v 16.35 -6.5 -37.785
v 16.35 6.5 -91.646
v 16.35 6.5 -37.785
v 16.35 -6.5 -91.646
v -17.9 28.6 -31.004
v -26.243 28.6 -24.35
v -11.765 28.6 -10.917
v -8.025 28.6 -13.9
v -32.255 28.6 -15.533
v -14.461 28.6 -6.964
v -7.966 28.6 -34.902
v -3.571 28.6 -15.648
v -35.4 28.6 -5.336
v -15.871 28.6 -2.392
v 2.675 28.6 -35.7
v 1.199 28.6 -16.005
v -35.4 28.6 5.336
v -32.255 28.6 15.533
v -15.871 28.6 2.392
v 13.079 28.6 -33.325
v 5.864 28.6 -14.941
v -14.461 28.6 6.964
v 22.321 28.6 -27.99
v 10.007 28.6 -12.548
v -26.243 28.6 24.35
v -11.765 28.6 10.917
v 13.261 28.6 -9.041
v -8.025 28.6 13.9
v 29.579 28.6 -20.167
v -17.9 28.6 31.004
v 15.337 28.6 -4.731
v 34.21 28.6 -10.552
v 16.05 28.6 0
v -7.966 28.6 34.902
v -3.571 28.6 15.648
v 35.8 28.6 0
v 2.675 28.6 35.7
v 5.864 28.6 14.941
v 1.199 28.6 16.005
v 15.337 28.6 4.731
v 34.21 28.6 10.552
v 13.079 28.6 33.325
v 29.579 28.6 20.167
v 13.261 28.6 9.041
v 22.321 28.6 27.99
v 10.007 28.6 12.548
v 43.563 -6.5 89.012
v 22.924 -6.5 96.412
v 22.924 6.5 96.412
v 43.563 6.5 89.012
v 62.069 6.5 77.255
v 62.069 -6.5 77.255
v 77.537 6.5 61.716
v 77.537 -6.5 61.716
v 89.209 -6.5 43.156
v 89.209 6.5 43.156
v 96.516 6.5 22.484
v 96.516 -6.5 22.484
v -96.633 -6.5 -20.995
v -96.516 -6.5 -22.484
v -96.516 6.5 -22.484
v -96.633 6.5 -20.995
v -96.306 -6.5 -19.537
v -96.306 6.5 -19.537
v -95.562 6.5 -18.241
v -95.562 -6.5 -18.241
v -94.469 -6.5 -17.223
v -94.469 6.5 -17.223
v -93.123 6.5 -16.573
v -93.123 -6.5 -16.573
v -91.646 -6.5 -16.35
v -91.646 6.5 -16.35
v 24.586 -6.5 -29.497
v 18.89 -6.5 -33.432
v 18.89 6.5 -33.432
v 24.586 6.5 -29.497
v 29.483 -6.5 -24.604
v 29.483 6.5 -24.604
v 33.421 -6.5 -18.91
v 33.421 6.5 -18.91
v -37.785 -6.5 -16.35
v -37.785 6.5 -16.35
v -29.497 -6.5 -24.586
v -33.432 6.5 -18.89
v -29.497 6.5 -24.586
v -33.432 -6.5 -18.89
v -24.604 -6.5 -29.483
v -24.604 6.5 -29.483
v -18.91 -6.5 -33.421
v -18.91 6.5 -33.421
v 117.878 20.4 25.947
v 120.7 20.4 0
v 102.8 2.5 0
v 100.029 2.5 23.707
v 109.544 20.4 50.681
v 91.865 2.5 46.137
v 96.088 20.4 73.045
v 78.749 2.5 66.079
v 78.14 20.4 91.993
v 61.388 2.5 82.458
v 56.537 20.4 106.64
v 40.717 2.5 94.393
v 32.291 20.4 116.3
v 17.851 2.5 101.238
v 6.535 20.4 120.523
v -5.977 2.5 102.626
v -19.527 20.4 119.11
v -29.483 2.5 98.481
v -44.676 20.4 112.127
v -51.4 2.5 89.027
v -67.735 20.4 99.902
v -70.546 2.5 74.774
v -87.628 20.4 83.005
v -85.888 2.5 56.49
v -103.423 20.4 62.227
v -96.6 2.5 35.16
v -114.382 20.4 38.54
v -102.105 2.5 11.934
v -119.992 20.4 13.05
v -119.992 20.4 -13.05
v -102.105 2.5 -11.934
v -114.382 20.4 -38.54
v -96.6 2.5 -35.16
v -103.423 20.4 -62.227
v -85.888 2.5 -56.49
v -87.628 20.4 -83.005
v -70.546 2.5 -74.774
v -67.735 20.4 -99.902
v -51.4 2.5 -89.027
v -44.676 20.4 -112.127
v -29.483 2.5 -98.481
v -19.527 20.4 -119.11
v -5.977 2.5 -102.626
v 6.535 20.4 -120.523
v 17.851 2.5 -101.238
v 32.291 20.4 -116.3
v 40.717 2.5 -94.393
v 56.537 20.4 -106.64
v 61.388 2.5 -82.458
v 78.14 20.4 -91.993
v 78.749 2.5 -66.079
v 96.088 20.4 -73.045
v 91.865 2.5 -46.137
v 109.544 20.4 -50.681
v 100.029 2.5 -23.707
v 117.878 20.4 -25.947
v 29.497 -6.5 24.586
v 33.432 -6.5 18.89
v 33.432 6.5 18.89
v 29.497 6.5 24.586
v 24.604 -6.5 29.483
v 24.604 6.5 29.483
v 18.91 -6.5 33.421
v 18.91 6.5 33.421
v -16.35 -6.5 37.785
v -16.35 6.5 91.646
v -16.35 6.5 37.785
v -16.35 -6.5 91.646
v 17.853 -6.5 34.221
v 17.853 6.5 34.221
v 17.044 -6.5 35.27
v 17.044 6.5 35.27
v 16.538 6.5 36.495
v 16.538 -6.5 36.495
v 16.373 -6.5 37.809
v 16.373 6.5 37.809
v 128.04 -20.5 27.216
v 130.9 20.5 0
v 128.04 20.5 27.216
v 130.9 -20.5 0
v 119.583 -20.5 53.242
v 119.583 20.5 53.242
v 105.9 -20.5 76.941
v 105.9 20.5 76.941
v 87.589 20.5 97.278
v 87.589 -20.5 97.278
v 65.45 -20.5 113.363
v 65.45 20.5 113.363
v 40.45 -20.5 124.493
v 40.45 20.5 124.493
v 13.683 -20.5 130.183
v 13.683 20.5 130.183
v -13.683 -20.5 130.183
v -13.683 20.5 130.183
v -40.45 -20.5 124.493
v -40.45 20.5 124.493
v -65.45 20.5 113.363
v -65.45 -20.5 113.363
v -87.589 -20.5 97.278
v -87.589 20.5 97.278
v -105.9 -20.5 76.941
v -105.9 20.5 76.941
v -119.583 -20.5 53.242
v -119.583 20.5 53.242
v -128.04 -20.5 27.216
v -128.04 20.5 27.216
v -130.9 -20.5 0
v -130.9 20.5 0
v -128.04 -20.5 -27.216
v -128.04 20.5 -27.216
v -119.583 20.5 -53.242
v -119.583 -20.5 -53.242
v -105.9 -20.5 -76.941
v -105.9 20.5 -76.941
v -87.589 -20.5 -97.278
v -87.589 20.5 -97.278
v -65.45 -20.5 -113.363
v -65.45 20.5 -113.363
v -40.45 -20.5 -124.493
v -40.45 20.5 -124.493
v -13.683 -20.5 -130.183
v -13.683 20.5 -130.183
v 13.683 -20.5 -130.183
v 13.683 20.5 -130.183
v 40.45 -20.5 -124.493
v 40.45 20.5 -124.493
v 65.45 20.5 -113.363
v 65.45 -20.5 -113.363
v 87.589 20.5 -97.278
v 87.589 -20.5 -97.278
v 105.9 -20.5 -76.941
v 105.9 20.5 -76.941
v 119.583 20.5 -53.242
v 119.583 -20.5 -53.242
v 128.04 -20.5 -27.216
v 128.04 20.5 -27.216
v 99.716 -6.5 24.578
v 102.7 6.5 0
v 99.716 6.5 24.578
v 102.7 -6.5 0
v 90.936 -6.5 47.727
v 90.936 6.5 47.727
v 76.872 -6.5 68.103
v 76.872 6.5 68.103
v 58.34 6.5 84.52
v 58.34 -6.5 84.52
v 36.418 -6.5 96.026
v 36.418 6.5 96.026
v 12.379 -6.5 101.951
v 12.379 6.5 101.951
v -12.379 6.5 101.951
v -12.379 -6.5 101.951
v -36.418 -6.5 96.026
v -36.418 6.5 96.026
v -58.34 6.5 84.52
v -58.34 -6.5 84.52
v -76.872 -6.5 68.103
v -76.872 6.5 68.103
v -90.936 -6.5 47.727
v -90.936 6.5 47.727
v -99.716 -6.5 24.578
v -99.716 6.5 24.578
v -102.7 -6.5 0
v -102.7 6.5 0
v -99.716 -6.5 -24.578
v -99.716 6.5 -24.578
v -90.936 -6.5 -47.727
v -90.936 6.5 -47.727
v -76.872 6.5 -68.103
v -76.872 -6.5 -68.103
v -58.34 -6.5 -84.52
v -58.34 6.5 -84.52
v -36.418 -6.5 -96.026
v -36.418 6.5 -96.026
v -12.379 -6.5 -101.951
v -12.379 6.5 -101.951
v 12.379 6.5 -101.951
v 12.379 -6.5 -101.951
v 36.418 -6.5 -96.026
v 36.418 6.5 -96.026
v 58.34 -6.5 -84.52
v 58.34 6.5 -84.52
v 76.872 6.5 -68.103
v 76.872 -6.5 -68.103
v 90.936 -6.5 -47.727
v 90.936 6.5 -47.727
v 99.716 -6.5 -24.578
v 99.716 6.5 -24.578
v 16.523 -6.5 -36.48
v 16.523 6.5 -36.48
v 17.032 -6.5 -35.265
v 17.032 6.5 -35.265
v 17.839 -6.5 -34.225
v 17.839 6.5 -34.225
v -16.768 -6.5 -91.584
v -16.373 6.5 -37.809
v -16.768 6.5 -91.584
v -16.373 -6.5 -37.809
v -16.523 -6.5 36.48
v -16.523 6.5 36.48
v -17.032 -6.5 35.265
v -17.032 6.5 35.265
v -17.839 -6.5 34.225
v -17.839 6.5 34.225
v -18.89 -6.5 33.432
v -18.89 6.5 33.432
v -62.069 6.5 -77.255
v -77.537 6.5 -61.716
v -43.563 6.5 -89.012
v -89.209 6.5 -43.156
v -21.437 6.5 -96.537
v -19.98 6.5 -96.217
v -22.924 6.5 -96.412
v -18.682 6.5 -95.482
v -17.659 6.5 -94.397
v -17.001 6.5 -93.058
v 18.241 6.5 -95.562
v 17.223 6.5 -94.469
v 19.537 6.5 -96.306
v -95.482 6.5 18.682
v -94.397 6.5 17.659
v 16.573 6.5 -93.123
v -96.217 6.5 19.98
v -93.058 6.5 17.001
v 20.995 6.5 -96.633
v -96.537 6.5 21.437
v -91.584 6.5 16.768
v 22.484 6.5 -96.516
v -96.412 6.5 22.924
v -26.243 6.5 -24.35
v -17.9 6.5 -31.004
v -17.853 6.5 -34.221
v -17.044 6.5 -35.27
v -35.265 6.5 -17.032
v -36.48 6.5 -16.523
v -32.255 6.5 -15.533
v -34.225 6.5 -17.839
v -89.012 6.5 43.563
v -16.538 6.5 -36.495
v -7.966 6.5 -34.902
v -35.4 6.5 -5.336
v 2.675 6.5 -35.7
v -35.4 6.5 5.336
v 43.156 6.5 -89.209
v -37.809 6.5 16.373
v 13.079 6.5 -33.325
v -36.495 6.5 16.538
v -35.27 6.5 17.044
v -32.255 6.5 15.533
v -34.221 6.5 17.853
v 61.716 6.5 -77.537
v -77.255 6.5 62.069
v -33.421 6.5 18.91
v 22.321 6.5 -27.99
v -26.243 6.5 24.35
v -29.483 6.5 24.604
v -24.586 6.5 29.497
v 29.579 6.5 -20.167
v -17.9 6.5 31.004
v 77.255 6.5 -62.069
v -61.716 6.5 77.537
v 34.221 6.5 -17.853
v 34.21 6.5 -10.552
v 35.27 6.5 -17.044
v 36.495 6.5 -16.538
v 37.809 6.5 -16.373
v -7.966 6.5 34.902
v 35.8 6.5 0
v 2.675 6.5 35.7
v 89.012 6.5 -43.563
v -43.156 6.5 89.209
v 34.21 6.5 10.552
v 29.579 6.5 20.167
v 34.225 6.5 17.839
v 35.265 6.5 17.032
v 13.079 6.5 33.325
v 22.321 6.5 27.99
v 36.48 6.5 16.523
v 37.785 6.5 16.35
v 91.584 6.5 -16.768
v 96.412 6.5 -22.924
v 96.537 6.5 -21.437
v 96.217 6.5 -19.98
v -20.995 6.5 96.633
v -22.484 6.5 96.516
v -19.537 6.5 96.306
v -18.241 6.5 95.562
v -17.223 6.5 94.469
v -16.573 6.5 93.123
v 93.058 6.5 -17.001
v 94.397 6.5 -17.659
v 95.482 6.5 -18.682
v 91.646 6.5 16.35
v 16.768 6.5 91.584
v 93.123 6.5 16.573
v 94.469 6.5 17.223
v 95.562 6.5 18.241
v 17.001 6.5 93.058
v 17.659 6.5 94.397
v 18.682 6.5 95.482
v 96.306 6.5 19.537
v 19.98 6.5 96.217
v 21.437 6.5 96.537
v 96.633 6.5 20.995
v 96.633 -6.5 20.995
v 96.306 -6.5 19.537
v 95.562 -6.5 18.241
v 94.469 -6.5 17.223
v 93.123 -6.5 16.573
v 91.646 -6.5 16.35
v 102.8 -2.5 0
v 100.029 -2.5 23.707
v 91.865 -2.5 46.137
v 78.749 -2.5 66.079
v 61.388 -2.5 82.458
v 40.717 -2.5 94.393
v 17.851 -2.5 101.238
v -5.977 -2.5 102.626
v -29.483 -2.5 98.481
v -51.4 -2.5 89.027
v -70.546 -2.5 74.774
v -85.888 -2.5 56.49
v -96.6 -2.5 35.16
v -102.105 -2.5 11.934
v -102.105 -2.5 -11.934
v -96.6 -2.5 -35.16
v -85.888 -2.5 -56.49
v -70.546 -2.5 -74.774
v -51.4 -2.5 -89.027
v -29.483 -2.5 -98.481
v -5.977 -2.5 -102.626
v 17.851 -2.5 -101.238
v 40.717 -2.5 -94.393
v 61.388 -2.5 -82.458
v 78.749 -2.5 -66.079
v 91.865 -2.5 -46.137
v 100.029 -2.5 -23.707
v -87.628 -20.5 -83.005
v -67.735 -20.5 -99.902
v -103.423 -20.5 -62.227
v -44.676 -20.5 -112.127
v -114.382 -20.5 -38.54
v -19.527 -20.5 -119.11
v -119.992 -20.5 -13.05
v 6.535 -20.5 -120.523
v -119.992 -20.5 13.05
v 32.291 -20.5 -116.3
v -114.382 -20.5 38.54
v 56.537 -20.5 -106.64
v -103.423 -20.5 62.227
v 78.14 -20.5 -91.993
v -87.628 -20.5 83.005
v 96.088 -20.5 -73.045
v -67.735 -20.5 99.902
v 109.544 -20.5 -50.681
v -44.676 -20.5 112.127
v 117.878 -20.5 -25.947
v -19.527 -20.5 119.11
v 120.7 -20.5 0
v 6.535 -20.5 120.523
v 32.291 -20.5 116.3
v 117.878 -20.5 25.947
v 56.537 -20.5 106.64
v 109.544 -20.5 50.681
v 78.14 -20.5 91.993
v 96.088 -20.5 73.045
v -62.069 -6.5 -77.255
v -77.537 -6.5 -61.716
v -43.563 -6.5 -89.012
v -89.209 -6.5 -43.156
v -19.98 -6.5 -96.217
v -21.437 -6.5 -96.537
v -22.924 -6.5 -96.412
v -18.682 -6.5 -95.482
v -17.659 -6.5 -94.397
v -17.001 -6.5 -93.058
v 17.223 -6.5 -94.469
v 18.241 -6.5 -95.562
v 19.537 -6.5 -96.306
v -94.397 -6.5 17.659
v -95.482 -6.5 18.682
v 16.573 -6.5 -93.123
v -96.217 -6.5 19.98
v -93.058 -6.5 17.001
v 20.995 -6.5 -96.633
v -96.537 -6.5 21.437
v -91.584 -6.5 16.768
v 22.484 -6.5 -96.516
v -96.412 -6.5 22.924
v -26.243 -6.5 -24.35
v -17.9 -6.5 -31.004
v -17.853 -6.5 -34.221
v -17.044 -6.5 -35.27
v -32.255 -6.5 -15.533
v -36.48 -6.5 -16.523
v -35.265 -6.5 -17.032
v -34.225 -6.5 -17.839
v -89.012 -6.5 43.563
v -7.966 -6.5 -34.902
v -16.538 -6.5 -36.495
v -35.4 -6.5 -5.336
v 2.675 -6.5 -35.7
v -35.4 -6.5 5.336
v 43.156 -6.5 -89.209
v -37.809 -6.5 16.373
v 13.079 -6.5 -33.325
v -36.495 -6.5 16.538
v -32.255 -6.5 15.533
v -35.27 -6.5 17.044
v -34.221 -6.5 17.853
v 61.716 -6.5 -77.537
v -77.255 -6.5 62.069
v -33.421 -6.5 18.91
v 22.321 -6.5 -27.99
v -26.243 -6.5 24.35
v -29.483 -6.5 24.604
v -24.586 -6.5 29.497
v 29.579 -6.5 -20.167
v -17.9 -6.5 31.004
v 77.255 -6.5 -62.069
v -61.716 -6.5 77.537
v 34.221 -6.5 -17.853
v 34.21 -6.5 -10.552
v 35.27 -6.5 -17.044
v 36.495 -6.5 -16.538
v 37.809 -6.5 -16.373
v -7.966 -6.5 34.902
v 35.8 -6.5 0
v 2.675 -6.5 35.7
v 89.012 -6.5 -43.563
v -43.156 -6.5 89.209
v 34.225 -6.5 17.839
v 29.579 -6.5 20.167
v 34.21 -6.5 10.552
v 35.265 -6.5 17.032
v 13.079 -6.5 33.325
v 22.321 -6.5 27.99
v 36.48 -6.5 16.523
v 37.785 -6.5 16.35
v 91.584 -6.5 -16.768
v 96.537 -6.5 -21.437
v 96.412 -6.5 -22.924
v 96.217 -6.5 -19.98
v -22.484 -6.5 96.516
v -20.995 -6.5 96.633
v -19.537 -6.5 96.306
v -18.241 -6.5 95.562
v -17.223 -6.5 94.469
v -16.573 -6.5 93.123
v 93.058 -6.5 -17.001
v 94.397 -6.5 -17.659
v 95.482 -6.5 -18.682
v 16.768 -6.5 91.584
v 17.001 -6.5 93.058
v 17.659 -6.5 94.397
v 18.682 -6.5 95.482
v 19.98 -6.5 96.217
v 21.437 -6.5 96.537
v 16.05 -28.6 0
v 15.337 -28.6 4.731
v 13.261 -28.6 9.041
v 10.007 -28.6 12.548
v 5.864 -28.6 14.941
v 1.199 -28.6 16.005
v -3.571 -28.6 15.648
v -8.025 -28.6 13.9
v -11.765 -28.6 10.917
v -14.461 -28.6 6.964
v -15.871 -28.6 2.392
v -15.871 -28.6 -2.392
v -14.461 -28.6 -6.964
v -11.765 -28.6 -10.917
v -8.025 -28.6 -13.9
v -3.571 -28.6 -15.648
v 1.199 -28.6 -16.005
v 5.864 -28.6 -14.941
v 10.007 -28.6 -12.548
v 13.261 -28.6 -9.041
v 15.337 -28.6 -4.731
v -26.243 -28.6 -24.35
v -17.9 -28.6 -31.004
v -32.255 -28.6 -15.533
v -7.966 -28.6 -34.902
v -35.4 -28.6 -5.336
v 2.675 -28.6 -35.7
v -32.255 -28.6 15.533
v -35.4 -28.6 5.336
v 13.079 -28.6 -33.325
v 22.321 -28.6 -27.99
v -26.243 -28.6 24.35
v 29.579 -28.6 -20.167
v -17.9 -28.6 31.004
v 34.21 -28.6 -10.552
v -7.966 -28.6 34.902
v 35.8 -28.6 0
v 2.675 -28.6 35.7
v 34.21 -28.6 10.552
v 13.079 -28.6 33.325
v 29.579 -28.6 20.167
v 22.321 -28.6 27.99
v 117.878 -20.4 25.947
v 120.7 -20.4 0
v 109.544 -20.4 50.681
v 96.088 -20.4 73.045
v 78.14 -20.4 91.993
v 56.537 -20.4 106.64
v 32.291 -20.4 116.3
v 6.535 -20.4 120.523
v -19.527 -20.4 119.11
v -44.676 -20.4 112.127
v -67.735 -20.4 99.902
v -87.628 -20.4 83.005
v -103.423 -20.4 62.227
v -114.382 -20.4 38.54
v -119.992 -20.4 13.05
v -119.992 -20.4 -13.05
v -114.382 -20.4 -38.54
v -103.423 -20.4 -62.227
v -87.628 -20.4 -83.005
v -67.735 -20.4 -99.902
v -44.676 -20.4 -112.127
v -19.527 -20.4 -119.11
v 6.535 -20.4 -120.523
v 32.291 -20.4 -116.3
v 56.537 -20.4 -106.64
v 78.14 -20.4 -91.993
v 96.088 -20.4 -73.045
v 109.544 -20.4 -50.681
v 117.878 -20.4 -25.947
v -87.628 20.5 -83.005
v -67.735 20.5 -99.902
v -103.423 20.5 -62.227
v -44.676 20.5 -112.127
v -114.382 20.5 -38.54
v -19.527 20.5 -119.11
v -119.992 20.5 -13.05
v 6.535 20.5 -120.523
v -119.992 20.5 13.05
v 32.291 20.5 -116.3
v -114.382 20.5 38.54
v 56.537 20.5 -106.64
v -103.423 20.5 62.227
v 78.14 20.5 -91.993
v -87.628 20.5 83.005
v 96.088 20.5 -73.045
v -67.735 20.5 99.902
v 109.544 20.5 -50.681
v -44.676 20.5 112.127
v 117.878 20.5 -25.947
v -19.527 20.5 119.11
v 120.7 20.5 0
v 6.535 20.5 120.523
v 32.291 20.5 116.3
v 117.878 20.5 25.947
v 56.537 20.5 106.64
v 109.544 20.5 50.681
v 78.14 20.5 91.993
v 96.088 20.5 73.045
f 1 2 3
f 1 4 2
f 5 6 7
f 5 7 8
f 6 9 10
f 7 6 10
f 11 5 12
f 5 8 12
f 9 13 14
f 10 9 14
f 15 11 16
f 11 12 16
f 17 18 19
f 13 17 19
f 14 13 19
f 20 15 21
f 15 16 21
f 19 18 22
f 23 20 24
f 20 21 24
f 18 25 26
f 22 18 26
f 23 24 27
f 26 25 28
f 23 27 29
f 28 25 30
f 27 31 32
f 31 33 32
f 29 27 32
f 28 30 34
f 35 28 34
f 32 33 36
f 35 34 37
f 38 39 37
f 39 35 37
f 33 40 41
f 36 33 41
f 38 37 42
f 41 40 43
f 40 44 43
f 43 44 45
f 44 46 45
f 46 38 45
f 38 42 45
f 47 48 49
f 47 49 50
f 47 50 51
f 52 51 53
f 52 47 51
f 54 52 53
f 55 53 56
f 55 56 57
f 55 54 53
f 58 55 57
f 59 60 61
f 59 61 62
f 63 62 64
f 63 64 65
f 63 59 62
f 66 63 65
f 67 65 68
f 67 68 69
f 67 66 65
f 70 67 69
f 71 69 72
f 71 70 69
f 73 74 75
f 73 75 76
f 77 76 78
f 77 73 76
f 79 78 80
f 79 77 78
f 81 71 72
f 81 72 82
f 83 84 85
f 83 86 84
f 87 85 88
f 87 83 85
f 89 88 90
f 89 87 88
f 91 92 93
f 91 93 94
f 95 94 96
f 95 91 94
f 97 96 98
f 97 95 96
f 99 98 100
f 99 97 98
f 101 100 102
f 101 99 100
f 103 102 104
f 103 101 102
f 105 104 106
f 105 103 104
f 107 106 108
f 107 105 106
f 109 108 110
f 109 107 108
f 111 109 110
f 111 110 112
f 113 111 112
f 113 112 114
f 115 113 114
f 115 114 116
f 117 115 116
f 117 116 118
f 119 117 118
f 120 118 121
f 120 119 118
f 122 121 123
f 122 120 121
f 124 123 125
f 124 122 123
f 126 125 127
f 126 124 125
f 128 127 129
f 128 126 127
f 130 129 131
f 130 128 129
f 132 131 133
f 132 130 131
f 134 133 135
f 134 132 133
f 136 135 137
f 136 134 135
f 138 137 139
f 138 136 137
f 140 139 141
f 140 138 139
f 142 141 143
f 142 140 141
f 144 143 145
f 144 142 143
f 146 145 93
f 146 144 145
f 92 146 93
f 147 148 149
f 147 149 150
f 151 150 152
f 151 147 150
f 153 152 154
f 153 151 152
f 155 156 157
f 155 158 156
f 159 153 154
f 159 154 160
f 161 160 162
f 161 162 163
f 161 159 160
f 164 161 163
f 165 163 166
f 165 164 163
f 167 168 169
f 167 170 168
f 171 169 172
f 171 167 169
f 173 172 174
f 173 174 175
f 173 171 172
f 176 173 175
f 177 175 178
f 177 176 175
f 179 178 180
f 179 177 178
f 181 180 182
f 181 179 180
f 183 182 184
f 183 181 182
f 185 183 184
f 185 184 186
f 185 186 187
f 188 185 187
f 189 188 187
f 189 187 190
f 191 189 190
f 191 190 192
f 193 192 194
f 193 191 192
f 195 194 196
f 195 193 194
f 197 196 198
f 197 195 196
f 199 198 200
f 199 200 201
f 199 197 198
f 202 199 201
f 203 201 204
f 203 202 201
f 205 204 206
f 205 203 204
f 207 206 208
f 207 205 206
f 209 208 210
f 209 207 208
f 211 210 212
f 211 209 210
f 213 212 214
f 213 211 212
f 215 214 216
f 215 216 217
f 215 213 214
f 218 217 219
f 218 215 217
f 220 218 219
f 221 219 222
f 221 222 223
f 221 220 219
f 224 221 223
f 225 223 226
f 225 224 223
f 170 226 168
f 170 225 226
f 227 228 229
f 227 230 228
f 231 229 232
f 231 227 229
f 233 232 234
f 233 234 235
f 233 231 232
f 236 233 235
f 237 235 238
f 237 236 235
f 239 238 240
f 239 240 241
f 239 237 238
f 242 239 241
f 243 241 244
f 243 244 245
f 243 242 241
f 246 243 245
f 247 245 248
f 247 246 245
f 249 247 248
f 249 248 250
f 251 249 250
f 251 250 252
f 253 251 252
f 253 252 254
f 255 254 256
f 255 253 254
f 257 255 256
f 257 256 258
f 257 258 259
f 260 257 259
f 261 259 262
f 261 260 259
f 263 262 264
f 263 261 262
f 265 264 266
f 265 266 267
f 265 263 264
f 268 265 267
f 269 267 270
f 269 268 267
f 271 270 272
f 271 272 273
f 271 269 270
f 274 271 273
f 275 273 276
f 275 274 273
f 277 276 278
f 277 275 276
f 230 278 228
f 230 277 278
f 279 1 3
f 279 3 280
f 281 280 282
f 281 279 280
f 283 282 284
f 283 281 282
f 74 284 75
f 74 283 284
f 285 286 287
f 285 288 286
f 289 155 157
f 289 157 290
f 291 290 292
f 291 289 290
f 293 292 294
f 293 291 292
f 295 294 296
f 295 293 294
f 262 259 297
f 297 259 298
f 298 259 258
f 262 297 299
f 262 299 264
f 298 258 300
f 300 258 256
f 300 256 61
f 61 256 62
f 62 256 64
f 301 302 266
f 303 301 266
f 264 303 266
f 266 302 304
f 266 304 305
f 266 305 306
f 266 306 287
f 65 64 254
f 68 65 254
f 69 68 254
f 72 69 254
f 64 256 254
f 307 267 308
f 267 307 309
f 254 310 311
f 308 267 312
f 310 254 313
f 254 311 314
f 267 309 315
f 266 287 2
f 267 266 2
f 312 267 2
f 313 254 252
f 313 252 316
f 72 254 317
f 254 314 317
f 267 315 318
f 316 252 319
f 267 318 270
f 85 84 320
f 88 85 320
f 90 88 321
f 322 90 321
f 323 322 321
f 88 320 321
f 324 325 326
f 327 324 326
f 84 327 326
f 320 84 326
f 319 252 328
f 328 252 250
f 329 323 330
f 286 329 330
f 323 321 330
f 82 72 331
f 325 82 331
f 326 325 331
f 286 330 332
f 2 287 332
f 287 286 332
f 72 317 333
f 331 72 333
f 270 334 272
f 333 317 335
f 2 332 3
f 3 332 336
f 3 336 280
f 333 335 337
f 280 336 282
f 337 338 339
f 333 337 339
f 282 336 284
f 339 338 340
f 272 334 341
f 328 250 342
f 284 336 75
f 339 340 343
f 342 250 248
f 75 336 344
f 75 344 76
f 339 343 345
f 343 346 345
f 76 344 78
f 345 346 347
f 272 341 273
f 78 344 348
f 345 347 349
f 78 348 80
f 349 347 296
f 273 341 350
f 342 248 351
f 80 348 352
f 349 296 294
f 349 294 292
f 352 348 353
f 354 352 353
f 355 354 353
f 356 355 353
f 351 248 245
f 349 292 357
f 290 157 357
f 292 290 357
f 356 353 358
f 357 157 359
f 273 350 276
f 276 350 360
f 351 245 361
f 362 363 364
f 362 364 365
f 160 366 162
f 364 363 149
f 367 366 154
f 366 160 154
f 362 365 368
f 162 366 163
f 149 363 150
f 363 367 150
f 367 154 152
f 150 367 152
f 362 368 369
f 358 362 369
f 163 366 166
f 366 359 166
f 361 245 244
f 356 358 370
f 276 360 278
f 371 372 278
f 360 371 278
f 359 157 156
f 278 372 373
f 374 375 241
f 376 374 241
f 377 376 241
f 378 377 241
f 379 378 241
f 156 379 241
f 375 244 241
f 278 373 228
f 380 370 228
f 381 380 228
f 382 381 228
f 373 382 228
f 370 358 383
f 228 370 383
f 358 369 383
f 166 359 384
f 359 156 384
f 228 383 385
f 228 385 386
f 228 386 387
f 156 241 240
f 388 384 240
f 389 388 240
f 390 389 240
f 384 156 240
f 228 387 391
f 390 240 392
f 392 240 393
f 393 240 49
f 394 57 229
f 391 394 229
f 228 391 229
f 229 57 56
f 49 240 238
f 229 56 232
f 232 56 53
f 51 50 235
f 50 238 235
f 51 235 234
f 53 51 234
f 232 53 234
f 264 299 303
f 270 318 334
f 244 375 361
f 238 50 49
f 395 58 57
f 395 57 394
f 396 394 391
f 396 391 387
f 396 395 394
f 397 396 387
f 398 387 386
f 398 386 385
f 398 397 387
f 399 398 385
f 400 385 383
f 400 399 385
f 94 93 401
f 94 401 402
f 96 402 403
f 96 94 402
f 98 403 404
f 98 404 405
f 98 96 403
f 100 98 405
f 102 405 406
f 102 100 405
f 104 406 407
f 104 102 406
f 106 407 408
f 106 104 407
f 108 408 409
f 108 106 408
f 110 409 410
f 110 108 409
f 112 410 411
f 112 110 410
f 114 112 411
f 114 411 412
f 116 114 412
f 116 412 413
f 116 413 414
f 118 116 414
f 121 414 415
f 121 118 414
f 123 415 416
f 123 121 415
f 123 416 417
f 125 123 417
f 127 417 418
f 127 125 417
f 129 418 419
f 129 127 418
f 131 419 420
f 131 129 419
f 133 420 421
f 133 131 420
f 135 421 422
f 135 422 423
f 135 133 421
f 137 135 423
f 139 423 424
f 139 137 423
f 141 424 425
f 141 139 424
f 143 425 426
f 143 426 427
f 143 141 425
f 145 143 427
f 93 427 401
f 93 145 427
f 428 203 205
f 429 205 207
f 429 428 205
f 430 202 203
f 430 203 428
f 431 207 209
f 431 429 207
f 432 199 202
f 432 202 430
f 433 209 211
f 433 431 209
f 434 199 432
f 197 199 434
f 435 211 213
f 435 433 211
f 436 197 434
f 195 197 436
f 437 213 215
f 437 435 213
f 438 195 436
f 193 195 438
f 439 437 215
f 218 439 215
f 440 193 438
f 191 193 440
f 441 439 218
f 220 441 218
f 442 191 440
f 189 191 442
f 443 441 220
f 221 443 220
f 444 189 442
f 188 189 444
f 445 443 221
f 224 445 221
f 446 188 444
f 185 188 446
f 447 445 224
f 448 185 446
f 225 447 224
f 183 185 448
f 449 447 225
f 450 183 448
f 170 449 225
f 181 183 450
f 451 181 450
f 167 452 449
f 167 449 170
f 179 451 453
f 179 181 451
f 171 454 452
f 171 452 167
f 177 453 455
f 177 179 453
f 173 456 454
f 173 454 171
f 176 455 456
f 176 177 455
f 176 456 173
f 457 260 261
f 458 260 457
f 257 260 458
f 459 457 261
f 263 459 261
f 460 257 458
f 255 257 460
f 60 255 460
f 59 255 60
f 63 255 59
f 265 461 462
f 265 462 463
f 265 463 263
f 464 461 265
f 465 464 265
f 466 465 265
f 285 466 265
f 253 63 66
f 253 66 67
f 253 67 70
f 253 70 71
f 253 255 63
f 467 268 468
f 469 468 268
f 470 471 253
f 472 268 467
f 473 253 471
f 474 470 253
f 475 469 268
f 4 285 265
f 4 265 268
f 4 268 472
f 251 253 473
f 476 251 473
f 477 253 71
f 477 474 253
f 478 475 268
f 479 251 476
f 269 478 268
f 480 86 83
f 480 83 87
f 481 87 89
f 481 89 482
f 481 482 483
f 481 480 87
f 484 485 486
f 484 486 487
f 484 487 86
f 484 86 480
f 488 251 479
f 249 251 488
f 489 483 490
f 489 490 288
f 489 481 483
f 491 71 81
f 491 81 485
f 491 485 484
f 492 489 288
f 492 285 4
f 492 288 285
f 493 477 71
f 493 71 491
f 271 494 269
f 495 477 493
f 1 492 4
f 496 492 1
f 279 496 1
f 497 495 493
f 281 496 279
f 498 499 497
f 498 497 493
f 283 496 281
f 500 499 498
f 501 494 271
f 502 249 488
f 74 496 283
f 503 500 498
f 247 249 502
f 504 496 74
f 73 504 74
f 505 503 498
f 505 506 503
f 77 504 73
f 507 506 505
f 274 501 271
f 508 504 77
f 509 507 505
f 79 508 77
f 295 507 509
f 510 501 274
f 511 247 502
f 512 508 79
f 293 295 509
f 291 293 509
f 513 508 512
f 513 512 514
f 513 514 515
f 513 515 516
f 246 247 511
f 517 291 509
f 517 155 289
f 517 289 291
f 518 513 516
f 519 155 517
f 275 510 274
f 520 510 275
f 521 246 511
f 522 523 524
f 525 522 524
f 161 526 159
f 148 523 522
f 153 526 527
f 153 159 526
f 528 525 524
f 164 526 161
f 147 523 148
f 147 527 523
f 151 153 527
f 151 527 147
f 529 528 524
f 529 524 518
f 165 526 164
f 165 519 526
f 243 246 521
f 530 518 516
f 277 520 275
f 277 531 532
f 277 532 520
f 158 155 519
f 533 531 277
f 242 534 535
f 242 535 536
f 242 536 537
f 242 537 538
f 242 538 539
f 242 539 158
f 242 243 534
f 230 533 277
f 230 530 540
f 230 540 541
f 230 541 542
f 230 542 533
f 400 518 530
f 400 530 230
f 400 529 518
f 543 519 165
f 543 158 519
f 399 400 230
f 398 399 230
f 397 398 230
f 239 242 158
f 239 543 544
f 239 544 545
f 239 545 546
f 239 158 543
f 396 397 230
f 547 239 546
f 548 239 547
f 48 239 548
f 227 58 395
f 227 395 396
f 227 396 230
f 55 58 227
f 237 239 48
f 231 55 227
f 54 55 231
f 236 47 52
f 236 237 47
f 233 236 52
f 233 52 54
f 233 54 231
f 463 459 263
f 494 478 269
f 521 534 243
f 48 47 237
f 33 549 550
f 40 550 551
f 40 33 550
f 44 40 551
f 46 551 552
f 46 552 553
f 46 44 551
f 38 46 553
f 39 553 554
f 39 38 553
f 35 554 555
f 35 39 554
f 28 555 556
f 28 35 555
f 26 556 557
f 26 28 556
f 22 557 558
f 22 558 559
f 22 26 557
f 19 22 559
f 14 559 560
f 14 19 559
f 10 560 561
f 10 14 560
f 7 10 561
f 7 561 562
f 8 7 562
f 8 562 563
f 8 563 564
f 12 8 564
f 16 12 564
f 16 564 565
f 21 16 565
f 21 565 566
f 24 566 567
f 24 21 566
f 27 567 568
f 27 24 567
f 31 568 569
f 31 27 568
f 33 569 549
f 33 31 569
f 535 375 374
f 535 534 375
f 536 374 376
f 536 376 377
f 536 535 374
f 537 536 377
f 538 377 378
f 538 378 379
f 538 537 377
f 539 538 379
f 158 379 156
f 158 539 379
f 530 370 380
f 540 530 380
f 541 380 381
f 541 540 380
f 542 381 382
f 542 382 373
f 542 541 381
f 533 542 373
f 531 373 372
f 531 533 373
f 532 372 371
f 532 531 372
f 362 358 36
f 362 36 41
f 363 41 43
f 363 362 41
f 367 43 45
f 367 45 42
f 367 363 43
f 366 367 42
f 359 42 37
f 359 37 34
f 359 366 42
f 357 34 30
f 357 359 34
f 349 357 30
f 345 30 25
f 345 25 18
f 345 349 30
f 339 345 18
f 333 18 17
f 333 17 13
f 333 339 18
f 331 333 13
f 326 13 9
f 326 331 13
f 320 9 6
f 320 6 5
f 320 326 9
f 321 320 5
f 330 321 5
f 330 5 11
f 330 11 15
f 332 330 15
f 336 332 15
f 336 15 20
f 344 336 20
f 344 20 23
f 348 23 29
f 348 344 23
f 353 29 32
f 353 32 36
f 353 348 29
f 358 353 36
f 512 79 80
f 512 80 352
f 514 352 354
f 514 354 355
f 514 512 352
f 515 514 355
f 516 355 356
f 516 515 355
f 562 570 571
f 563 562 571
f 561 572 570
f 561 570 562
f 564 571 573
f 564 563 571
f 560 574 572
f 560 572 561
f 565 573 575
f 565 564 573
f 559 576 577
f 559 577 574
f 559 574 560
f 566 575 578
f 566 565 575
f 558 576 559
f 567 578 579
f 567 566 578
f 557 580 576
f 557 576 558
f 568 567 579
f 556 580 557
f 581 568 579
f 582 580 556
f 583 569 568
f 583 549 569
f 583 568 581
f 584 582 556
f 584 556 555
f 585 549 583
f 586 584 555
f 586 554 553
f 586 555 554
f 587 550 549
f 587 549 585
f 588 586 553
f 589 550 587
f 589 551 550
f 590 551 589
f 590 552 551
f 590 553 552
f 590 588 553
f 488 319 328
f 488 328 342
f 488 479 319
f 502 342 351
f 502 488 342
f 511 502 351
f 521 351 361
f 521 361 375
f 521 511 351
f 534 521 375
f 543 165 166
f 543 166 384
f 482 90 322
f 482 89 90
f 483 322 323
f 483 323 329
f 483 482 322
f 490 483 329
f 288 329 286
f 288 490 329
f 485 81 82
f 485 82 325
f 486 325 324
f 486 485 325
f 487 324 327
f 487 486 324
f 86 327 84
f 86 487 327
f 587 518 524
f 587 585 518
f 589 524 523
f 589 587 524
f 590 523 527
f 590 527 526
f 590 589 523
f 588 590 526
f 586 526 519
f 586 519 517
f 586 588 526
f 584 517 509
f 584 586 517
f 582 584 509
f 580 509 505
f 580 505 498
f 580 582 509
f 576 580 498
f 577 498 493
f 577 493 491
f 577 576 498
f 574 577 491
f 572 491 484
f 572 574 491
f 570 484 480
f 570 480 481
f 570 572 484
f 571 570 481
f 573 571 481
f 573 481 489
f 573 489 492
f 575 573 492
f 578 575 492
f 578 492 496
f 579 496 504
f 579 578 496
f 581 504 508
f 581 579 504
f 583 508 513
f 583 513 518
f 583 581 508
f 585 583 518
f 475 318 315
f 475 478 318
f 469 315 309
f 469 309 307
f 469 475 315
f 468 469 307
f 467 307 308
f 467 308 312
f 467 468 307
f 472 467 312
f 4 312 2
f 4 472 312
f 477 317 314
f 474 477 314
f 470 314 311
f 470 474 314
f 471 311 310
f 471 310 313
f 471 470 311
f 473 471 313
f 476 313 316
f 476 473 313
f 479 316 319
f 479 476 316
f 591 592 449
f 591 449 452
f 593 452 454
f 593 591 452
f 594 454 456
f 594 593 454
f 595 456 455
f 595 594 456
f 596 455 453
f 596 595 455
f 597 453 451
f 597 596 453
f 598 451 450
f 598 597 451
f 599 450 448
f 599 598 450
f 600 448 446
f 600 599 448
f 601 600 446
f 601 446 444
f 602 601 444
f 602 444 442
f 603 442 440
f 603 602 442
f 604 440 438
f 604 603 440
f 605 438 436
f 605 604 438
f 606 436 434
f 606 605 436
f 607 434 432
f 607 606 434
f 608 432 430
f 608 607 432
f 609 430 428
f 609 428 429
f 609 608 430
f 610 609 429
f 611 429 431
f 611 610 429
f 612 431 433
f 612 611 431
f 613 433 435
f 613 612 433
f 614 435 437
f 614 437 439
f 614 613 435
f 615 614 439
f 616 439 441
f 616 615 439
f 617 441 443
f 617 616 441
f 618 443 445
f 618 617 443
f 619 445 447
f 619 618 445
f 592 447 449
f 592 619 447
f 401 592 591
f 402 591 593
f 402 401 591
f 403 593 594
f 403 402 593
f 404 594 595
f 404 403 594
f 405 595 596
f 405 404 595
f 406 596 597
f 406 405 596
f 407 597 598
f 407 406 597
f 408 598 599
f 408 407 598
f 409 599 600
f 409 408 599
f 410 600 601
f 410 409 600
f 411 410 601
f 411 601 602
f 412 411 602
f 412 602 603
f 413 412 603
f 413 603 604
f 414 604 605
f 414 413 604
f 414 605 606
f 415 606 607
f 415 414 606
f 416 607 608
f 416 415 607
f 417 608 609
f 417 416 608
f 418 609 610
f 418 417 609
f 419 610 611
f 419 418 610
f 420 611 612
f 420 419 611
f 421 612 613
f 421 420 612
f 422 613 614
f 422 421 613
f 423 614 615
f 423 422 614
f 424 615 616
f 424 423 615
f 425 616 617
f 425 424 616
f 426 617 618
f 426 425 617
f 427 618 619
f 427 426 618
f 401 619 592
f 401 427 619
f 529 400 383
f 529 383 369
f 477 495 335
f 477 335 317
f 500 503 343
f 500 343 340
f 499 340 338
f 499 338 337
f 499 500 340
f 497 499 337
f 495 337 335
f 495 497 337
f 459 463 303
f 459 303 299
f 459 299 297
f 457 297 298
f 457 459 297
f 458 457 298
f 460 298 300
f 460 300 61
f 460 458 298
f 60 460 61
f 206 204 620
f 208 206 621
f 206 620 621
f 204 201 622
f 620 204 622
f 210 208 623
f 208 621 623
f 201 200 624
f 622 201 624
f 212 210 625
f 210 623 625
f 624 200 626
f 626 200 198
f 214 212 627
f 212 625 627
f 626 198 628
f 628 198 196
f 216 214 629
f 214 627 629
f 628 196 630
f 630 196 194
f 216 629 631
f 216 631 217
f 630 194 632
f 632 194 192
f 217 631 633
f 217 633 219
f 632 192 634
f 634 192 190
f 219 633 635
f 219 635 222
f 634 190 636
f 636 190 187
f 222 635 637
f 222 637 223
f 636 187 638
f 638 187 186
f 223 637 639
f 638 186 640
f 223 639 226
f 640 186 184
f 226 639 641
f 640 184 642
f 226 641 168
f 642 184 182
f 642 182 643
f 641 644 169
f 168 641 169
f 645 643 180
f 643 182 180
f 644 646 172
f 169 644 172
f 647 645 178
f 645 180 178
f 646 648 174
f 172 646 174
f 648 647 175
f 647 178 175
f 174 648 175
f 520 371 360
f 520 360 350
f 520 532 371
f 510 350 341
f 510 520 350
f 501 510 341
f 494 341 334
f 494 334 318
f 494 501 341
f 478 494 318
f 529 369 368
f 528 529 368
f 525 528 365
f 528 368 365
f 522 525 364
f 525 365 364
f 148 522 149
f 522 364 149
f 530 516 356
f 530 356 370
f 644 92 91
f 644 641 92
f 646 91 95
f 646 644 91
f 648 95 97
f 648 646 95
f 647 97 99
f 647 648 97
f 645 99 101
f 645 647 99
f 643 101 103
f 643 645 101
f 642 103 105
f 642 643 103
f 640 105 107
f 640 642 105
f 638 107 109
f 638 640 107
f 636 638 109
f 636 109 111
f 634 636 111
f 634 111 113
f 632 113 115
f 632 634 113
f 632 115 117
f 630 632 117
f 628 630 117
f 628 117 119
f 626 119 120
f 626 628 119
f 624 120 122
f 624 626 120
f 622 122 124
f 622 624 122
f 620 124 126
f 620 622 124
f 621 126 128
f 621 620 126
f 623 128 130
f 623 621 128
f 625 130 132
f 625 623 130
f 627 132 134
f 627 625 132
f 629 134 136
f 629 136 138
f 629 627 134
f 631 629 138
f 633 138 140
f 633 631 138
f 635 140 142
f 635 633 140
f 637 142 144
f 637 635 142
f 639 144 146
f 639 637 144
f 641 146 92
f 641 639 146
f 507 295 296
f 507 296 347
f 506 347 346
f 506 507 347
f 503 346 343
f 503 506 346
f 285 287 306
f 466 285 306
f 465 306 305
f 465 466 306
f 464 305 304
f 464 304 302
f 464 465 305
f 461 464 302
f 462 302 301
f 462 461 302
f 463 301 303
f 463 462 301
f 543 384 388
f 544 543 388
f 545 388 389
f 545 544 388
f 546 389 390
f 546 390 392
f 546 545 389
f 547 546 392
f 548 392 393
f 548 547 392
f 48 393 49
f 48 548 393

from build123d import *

# Parameters (mm, degrees)
F0_R     = 102.7
F0_R_2   = 35.8
F1_DEPTH = 6.5
F0_R_3   = 16.05
F2_DEPTH = 28.6
F3_R     = 120.7
F3_R_2   = 102.8
F4_DEPTH = 20.5
F3_R_3   = 130.9
F6_DEPTH = 20.5


# Not quite as in the source:
# - a fillet or chamfer that OpenCascade refuses, or shapes differently, is made with other operations: its cross-section is extruded or revolved along the edge and cut away or added


with BuildPart() as f1:
    # F0 (on Front) → F1 (new body, symmetric)
    with BuildSketch(Plane.XZ):
        Circle(F0_R)
        with BuildLine():
            ThreePointArc((-22.9240592059, -96.4121232497), (-70.2337791547, -69.9144210135), (-96.5155963671, -22.4844314559))
            ThreePointArc((-96.5155963671, -22.4844314559), (-95.5621206621, -18.2413151719), (-91.6459900923, -16.35))
            Line((-91.6459900923, -16.35), (-37.7854138524, -16.35))
            ThreePointArc((-37.7854138524, -16.35), (-35.2653332086, -17.031528795), (-33.4322555745, -18.8903225806))
            ThreePointArc((-33.4322555745, -18.8903225806), (-27.1609405883, -27.1448578253), (-18.9101213144, -33.4210609029))
            ThreePointArc((-18.9101213144, -33.4210609029), (-17.0439362056, -35.2698426574), (-16.3725116244, -37.8094941823))
            Line((-16.3725116244, -37.8094941823), (-16.7675816639, -91.5844702575))
            ThreePointArc((-16.7675816639, -91.5844702575), (-18.682125683, -95.4823016351), (-22.9240592059, -96.4121232497))
        make_face(mode=Mode.SUBTRACT)
        Circle(F0_R_2, mode=Mode.SUBTRACT)
        with BuildLine():
            ThreePointArc((16.35, -37.7854138524), (17.031528795, -35.2653332086), (18.8903225806, -33.4322555745))
            ThreePointArc((18.8903225806, -33.4322555745), (27.1448578253, -27.1609405883), (33.4210609029, -18.9101213144))
            ThreePointArc((33.4210609029, -18.9101213144), (35.2698426574, -17.0439362056), (37.8094941823, -16.3725116244))
            Line((37.8094941823, -16.3725116244), (91.5844702575, -16.7675816639))
            ThreePointArc((91.5844702575, -16.7675816639), (95.4823016351, -18.682125683), (96.4121232497, -22.9240592059))
            ThreePointArc((96.4121232497, -22.9240592059), (69.9144210135, -70.2337791547), (22.4844314559, -96.5155963671))
            ThreePointArc((22.4844314559, -96.5155963671), (18.2413151719, -95.5621206621), (16.35, -91.6459900923))
            Line((16.35, -91.6459900923), (16.35, -37.7854138524))
        make_face(mode=Mode.SUBTRACT)
        with BuildLine():
            ThreePointArc((-16.35, 37.7854138524), (-17.031528795, 35.2653332086), (-18.8903225806, 33.4322555745))
            ThreePointArc((-18.8903225806, 33.4322555745), (-27.1448578253, 27.1609405883), (-33.4210609029, 18.9101213144))
            ThreePointArc((-33.4210609029, 18.9101213144), (-35.2698426574, 17.0439362056), (-37.8094941823, 16.3725116244))
            Line((-37.8094941823, 16.3725116244), (-91.5844702575, 16.7675816639))
            ThreePointArc((-91.5844702575, 16.7675816639), (-95.4823016351, 18.682125683), (-96.4121232497, 22.9240592059))
            ThreePointArc((-96.4121232497, 22.9240592059), (-69.9144210135, 70.2337791547), (-22.4844314559, 96.5155963671))
            ThreePointArc((-22.4844314559, 96.5155963671), (-18.2413151719, 95.5621206621), (-16.35, 91.6459900923))
            Line((-16.35, 91.6459900923), (-16.35, 37.7854138524))
        make_face(mode=Mode.SUBTRACT)
        with BuildLine():
            ThreePointArc((37.7854138524, 16.35), (35.2653332086, 17.031528795), (33.4322555745, 18.8903225806))
            ThreePointArc((33.4322555745, 18.8903225806), (27.1609405883, 27.1448578253), (18.9101213144, 33.4210609029))
            ThreePointArc((18.9101213144, 33.4210609029), (17.0439362056, 35.2698426574), (16.3725116244, 37.8094941823))
            Line((16.3725116244, 37.8094941823), (16.7675816639, 91.5844702575))
            ThreePointArc((16.7675816639, 91.5844702575), (18.682125683, 95.4823016351), (22.9240592059, 96.4121232497))
            ThreePointArc((22.9240592059, 96.4121232497), (70.2337791547, 69.9144210135), (96.5155963671, 22.4844314559))
            ThreePointArc((96.5155963671, 22.4844314559), (95.5621206621, 18.2413151719), (91.6459900923, 16.35))
            Line((91.6459900923, 16.35), (37.7854138524, 16.35))
        make_face(mode=Mode.SUBTRACT)
    extrude(amount=F1_DEPTH, both=True)

    # F0 (on Front) → F2 (join, symmetric)
    with BuildSketch(Plane.XZ):
        Circle(F0_R_2)
        Circle(F0_R_3, mode=Mode.SUBTRACT)
    extrude(amount=F2_DEPTH, both=True)


with BuildPart() as f4:
    # F3 (on Front) → F4 (new body, symmetric)
    with BuildSketch(Plane.XZ):
        Circle(F3_R)
        Circle(F3_R_2, mode=Mode.SUBTRACT)
    extrude(amount=F4_DEPTH, both=True)

    # F5: chamfer of 18 on 3 edges, made by hand

    # F5_s1 → F5_t2 (revolve, cut)
    with BuildSketch(Plane.XY):
        Polygon((120.8, -20.5), (102.8, -2.5), (102.8, -20.5), align=None)
    revolve(axis=Axis((0, -20.5, 0), (0, -1, 0)), mode=Mode.SUBTRACT)

    # F5_s3 → F5_t4 (revolve, cut)
    with BuildSketch(Plane.XY):
        Polygon((102.8, 2.5), (120.8, 20.5), (102.8, 20.5), align=None)
    revolve(axis=Axis((0, 20.5, 0), (0, -1, 0)), mode=Mode.SUBTRACT)

    # F3 (on Front) → F6 (join, symmetric)
    with BuildSketch(Plane.XZ):
        Circle(F3_R_3)
        Circle(F3_R, mode=Mode.SUBTRACT)
    extrude(amount=F6_DEPTH, both=True)


solid = Compound([f1.part, f4.part])
